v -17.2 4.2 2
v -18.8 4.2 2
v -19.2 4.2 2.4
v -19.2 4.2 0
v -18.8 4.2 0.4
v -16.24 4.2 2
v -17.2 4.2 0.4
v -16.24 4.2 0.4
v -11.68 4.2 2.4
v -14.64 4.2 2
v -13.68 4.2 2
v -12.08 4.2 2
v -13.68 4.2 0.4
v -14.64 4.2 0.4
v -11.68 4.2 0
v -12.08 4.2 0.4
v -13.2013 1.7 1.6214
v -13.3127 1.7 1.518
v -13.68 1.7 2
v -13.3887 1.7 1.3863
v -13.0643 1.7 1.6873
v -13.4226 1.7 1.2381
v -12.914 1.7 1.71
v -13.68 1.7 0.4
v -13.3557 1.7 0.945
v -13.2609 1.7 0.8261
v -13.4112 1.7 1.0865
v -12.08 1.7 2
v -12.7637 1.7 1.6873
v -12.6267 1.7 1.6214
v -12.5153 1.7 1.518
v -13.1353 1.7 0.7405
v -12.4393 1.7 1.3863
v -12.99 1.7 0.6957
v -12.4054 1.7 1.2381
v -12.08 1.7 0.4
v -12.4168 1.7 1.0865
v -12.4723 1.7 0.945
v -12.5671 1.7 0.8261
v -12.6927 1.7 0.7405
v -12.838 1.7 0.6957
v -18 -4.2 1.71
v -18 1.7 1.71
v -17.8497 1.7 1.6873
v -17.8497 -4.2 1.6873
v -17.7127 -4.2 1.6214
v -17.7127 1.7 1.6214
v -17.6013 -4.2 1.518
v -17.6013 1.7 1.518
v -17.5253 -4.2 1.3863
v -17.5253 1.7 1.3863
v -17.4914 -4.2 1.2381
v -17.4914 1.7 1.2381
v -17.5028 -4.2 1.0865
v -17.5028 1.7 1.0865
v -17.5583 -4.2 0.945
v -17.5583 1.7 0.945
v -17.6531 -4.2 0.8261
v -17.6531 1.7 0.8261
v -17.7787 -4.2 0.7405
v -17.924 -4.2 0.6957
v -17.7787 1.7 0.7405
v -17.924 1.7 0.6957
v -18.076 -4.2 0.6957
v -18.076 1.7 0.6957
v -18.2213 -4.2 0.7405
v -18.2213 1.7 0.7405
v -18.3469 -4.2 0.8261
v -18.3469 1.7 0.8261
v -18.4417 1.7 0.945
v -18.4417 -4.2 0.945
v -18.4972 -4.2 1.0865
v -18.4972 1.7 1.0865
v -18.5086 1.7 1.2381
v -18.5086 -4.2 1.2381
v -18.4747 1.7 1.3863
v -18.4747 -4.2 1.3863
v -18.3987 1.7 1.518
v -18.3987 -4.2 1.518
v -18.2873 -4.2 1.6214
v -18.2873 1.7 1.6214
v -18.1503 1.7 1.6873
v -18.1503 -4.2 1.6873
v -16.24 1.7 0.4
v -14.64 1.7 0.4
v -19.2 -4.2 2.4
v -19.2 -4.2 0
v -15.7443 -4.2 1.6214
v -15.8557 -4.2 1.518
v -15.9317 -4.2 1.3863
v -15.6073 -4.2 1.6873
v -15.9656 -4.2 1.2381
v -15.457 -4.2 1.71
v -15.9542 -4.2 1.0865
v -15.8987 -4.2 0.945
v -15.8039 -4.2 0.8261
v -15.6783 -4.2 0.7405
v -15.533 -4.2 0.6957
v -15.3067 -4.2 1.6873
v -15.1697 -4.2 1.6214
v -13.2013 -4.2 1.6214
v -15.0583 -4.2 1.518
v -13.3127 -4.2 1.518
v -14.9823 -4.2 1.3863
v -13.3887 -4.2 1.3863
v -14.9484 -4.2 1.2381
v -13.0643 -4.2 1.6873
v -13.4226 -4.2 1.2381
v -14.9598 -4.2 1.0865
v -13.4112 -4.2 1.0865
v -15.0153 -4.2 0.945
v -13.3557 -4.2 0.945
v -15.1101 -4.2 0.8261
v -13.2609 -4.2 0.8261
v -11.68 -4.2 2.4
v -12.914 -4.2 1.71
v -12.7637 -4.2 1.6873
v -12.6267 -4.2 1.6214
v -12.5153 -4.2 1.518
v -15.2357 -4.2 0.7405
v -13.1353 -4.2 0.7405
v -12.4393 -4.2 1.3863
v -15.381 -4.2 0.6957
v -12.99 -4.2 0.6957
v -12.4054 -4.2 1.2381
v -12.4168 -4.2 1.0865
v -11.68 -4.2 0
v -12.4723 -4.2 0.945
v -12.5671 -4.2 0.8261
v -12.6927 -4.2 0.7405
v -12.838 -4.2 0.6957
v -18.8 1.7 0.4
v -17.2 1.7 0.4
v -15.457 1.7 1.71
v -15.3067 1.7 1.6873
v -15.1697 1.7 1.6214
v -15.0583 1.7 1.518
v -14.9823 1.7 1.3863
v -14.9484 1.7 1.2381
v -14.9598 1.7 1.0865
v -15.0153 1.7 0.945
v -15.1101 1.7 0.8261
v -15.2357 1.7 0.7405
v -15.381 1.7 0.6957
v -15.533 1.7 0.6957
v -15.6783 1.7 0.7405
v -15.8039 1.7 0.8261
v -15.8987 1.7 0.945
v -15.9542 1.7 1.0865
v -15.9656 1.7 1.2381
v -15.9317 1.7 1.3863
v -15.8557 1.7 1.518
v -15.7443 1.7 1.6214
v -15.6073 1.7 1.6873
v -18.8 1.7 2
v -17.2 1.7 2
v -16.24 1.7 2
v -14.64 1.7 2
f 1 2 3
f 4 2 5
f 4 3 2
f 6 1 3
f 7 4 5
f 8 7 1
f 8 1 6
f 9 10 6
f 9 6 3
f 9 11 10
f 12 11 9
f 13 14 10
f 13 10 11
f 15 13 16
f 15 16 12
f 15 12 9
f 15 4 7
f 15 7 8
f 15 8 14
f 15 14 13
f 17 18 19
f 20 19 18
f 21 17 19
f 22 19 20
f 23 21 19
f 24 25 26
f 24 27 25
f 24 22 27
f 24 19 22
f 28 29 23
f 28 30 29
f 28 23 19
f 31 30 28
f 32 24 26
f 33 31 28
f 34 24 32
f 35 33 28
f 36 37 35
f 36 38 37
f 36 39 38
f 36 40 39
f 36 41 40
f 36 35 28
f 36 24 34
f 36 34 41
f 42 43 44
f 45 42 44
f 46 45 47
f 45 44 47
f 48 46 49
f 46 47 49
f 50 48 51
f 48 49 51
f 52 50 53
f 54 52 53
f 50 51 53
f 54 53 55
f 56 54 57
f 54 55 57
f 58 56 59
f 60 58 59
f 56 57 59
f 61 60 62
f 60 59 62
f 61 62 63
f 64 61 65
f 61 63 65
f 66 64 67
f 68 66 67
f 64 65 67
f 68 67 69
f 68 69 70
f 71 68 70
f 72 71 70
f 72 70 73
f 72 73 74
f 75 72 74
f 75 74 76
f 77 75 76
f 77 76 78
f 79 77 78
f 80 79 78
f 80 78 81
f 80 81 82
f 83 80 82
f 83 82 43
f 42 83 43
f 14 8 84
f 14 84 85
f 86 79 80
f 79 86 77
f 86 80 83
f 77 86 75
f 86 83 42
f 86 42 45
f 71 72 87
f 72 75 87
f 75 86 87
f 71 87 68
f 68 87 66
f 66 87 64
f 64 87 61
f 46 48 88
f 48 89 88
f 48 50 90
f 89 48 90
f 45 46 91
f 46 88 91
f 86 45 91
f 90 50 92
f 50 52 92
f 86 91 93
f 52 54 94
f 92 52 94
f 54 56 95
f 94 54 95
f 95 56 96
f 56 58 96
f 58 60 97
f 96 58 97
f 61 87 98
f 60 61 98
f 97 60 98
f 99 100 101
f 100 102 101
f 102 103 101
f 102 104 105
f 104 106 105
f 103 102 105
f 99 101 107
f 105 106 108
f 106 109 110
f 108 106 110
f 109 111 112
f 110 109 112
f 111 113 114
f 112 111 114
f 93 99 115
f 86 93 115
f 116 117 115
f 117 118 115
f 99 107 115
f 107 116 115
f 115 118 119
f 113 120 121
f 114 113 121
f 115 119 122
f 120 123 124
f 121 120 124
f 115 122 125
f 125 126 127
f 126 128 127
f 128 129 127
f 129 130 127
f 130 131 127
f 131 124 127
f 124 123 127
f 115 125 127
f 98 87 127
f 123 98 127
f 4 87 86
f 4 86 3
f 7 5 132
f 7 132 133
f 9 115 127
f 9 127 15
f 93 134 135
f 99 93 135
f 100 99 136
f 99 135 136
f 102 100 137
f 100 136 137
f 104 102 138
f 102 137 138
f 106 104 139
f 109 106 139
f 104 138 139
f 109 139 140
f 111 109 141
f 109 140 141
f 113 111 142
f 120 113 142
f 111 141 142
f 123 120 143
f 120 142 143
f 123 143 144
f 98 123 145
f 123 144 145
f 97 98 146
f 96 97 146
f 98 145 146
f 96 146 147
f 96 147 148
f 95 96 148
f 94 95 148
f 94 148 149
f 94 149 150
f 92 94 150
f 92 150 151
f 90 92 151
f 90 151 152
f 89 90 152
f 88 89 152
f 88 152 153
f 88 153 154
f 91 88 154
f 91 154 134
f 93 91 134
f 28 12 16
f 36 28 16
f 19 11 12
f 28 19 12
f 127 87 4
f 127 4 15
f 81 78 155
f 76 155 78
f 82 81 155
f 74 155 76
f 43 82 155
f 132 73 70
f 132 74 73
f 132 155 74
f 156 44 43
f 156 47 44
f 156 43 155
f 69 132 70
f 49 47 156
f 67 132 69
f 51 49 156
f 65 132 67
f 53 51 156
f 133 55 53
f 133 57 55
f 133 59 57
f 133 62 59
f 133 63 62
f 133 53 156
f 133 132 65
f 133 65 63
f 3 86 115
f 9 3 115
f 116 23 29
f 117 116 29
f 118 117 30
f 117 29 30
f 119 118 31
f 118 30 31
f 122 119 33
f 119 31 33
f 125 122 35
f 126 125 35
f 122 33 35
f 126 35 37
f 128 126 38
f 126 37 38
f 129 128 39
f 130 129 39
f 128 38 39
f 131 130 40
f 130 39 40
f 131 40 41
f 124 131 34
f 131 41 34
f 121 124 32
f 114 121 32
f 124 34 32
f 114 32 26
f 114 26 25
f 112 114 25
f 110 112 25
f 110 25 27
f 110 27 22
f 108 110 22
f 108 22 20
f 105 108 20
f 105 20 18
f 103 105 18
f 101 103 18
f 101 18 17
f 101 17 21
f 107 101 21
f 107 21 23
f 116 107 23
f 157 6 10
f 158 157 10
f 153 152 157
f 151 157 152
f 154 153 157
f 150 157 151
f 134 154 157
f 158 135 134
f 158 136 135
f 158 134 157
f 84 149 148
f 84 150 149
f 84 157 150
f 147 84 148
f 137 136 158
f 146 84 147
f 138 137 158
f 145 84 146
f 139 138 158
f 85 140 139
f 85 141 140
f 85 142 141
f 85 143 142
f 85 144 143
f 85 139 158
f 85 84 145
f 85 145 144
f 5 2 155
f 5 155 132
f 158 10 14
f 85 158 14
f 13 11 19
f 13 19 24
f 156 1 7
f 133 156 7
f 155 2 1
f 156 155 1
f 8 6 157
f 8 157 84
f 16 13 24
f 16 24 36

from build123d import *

# Parameters (mm, degrees)
ESBO_O1_W                = 38.4
ESBO_O1_H                = 8.4
RESSALTO_EXTRUS_O1_DEPTH = 2.4
ESBO_O2_W                = 1.6
ESBO_O2_H                = 1.6
CORTE_EXTRUS_O1_DEPTH    = 2.5
PADR_O_LINEAR1_COUNT     = 16
PADR_O_LINEAR1_PITCH     = 2.56
ESBO_O3_R                = 0.51
CORTE_EXTRUS_O2_DEPTH    = 21.228939666
PADR_O_LINEAR2_COUNT     = 15
PADR_O_LINEAR2_PITCH     = 2.543
ESBO_O6_W                = 18.080220827
ESBO_O6_H                = 8.4
CORTE_EXTRUS_O3_DEPTH    = 10
ESBO_O8_W                = 12.799779173
ESBO_O8_H                = 8.4
CORTE_EXTRUS_O4_DEPTH    = 10


with BuildPart() as part:
    # Esboço1 → Ressalto-extrusão1 (new body)
    with BuildSketch(Plane.XY):
        Rectangle(ESBO_O1_W, ESBO_O1_H)
    extrude(amount=RESSALTO_EXTRUS_O1_DEPTH)

    # Esboço2 → Corte-extrusão1 (cut)
    with BuildSketch(Plane(origin=(0, 4.2, 0), x_dir=(1, 0, 0), z_dir=(0, 1, 0))):
        with Locations((-18, -1.2)):
            Rectangle(ESBO_O2_W, ESBO_O2_H)
    corte_extrus_o1 = extrude(amount=-CORTE_EXTRUS_O1_DEPTH, mode=Mode.SUBTRACT)

    # Padrão linear1: Corte-extrusão1 ×16
    with Locations(*[(i * PADR_O_LINEAR1_PITCH, 0, 0) for i in range(1, PADR_O_LINEAR1_COUNT)]):
        add(corte_extrus_o1, mode=Mode.SUBTRACT)

    # Esboço3 → Corte-extrusão2 (cut, through all)
    with BuildSketch(Plane(origin=(0, 1.7, 0), x_dir=(1, 0, 0), z_dir=(0, 1, 0))):
        with Locations(Location((-18, -1.2, 0), (0, 0, 270))):
            Circle(ESBO_O3_R)
    corte_extrus_o2 = extrude(amount=-CORTE_EXTRUS_O2_DEPTH, mode=Mode.SUBTRACT)

    # Padrão linear2: Corte-extrusão2 ×15
    with Locations(*[(i * PADR_O_LINEAR2_PITCH, 0, 0) for i in range(1, PADR_O_LINEAR2_COUNT)]):
        add(corte_extrus_o2, mode=Mode.SUBTRACT)

    # Esboço6 → Corte-extrusão3 (cut)
    with BuildSketch(Plane.XY.offset(2.4)):
        with Locations((10.159889587, 0)):
            Rectangle(ESBO_O6_W, ESBO_O6_H)
    extrude(amount=-CORTE_EXTRUS_O3_DEPTH, mode=Mode.SUBTRACT)

    # Esboço8 → Corte-extrusão4 (cut)
    with BuildSketch(Plane.XY.offset(2.4)):
        with Locations((-5.280110414, 0)):
            Rectangle(ESBO_O8_W, ESBO_O8_H)
    extrude(amount=-CORTE_EXTRUS_O4_DEPTH, mode=Mode.SUBTRACT)


solid = part.part
